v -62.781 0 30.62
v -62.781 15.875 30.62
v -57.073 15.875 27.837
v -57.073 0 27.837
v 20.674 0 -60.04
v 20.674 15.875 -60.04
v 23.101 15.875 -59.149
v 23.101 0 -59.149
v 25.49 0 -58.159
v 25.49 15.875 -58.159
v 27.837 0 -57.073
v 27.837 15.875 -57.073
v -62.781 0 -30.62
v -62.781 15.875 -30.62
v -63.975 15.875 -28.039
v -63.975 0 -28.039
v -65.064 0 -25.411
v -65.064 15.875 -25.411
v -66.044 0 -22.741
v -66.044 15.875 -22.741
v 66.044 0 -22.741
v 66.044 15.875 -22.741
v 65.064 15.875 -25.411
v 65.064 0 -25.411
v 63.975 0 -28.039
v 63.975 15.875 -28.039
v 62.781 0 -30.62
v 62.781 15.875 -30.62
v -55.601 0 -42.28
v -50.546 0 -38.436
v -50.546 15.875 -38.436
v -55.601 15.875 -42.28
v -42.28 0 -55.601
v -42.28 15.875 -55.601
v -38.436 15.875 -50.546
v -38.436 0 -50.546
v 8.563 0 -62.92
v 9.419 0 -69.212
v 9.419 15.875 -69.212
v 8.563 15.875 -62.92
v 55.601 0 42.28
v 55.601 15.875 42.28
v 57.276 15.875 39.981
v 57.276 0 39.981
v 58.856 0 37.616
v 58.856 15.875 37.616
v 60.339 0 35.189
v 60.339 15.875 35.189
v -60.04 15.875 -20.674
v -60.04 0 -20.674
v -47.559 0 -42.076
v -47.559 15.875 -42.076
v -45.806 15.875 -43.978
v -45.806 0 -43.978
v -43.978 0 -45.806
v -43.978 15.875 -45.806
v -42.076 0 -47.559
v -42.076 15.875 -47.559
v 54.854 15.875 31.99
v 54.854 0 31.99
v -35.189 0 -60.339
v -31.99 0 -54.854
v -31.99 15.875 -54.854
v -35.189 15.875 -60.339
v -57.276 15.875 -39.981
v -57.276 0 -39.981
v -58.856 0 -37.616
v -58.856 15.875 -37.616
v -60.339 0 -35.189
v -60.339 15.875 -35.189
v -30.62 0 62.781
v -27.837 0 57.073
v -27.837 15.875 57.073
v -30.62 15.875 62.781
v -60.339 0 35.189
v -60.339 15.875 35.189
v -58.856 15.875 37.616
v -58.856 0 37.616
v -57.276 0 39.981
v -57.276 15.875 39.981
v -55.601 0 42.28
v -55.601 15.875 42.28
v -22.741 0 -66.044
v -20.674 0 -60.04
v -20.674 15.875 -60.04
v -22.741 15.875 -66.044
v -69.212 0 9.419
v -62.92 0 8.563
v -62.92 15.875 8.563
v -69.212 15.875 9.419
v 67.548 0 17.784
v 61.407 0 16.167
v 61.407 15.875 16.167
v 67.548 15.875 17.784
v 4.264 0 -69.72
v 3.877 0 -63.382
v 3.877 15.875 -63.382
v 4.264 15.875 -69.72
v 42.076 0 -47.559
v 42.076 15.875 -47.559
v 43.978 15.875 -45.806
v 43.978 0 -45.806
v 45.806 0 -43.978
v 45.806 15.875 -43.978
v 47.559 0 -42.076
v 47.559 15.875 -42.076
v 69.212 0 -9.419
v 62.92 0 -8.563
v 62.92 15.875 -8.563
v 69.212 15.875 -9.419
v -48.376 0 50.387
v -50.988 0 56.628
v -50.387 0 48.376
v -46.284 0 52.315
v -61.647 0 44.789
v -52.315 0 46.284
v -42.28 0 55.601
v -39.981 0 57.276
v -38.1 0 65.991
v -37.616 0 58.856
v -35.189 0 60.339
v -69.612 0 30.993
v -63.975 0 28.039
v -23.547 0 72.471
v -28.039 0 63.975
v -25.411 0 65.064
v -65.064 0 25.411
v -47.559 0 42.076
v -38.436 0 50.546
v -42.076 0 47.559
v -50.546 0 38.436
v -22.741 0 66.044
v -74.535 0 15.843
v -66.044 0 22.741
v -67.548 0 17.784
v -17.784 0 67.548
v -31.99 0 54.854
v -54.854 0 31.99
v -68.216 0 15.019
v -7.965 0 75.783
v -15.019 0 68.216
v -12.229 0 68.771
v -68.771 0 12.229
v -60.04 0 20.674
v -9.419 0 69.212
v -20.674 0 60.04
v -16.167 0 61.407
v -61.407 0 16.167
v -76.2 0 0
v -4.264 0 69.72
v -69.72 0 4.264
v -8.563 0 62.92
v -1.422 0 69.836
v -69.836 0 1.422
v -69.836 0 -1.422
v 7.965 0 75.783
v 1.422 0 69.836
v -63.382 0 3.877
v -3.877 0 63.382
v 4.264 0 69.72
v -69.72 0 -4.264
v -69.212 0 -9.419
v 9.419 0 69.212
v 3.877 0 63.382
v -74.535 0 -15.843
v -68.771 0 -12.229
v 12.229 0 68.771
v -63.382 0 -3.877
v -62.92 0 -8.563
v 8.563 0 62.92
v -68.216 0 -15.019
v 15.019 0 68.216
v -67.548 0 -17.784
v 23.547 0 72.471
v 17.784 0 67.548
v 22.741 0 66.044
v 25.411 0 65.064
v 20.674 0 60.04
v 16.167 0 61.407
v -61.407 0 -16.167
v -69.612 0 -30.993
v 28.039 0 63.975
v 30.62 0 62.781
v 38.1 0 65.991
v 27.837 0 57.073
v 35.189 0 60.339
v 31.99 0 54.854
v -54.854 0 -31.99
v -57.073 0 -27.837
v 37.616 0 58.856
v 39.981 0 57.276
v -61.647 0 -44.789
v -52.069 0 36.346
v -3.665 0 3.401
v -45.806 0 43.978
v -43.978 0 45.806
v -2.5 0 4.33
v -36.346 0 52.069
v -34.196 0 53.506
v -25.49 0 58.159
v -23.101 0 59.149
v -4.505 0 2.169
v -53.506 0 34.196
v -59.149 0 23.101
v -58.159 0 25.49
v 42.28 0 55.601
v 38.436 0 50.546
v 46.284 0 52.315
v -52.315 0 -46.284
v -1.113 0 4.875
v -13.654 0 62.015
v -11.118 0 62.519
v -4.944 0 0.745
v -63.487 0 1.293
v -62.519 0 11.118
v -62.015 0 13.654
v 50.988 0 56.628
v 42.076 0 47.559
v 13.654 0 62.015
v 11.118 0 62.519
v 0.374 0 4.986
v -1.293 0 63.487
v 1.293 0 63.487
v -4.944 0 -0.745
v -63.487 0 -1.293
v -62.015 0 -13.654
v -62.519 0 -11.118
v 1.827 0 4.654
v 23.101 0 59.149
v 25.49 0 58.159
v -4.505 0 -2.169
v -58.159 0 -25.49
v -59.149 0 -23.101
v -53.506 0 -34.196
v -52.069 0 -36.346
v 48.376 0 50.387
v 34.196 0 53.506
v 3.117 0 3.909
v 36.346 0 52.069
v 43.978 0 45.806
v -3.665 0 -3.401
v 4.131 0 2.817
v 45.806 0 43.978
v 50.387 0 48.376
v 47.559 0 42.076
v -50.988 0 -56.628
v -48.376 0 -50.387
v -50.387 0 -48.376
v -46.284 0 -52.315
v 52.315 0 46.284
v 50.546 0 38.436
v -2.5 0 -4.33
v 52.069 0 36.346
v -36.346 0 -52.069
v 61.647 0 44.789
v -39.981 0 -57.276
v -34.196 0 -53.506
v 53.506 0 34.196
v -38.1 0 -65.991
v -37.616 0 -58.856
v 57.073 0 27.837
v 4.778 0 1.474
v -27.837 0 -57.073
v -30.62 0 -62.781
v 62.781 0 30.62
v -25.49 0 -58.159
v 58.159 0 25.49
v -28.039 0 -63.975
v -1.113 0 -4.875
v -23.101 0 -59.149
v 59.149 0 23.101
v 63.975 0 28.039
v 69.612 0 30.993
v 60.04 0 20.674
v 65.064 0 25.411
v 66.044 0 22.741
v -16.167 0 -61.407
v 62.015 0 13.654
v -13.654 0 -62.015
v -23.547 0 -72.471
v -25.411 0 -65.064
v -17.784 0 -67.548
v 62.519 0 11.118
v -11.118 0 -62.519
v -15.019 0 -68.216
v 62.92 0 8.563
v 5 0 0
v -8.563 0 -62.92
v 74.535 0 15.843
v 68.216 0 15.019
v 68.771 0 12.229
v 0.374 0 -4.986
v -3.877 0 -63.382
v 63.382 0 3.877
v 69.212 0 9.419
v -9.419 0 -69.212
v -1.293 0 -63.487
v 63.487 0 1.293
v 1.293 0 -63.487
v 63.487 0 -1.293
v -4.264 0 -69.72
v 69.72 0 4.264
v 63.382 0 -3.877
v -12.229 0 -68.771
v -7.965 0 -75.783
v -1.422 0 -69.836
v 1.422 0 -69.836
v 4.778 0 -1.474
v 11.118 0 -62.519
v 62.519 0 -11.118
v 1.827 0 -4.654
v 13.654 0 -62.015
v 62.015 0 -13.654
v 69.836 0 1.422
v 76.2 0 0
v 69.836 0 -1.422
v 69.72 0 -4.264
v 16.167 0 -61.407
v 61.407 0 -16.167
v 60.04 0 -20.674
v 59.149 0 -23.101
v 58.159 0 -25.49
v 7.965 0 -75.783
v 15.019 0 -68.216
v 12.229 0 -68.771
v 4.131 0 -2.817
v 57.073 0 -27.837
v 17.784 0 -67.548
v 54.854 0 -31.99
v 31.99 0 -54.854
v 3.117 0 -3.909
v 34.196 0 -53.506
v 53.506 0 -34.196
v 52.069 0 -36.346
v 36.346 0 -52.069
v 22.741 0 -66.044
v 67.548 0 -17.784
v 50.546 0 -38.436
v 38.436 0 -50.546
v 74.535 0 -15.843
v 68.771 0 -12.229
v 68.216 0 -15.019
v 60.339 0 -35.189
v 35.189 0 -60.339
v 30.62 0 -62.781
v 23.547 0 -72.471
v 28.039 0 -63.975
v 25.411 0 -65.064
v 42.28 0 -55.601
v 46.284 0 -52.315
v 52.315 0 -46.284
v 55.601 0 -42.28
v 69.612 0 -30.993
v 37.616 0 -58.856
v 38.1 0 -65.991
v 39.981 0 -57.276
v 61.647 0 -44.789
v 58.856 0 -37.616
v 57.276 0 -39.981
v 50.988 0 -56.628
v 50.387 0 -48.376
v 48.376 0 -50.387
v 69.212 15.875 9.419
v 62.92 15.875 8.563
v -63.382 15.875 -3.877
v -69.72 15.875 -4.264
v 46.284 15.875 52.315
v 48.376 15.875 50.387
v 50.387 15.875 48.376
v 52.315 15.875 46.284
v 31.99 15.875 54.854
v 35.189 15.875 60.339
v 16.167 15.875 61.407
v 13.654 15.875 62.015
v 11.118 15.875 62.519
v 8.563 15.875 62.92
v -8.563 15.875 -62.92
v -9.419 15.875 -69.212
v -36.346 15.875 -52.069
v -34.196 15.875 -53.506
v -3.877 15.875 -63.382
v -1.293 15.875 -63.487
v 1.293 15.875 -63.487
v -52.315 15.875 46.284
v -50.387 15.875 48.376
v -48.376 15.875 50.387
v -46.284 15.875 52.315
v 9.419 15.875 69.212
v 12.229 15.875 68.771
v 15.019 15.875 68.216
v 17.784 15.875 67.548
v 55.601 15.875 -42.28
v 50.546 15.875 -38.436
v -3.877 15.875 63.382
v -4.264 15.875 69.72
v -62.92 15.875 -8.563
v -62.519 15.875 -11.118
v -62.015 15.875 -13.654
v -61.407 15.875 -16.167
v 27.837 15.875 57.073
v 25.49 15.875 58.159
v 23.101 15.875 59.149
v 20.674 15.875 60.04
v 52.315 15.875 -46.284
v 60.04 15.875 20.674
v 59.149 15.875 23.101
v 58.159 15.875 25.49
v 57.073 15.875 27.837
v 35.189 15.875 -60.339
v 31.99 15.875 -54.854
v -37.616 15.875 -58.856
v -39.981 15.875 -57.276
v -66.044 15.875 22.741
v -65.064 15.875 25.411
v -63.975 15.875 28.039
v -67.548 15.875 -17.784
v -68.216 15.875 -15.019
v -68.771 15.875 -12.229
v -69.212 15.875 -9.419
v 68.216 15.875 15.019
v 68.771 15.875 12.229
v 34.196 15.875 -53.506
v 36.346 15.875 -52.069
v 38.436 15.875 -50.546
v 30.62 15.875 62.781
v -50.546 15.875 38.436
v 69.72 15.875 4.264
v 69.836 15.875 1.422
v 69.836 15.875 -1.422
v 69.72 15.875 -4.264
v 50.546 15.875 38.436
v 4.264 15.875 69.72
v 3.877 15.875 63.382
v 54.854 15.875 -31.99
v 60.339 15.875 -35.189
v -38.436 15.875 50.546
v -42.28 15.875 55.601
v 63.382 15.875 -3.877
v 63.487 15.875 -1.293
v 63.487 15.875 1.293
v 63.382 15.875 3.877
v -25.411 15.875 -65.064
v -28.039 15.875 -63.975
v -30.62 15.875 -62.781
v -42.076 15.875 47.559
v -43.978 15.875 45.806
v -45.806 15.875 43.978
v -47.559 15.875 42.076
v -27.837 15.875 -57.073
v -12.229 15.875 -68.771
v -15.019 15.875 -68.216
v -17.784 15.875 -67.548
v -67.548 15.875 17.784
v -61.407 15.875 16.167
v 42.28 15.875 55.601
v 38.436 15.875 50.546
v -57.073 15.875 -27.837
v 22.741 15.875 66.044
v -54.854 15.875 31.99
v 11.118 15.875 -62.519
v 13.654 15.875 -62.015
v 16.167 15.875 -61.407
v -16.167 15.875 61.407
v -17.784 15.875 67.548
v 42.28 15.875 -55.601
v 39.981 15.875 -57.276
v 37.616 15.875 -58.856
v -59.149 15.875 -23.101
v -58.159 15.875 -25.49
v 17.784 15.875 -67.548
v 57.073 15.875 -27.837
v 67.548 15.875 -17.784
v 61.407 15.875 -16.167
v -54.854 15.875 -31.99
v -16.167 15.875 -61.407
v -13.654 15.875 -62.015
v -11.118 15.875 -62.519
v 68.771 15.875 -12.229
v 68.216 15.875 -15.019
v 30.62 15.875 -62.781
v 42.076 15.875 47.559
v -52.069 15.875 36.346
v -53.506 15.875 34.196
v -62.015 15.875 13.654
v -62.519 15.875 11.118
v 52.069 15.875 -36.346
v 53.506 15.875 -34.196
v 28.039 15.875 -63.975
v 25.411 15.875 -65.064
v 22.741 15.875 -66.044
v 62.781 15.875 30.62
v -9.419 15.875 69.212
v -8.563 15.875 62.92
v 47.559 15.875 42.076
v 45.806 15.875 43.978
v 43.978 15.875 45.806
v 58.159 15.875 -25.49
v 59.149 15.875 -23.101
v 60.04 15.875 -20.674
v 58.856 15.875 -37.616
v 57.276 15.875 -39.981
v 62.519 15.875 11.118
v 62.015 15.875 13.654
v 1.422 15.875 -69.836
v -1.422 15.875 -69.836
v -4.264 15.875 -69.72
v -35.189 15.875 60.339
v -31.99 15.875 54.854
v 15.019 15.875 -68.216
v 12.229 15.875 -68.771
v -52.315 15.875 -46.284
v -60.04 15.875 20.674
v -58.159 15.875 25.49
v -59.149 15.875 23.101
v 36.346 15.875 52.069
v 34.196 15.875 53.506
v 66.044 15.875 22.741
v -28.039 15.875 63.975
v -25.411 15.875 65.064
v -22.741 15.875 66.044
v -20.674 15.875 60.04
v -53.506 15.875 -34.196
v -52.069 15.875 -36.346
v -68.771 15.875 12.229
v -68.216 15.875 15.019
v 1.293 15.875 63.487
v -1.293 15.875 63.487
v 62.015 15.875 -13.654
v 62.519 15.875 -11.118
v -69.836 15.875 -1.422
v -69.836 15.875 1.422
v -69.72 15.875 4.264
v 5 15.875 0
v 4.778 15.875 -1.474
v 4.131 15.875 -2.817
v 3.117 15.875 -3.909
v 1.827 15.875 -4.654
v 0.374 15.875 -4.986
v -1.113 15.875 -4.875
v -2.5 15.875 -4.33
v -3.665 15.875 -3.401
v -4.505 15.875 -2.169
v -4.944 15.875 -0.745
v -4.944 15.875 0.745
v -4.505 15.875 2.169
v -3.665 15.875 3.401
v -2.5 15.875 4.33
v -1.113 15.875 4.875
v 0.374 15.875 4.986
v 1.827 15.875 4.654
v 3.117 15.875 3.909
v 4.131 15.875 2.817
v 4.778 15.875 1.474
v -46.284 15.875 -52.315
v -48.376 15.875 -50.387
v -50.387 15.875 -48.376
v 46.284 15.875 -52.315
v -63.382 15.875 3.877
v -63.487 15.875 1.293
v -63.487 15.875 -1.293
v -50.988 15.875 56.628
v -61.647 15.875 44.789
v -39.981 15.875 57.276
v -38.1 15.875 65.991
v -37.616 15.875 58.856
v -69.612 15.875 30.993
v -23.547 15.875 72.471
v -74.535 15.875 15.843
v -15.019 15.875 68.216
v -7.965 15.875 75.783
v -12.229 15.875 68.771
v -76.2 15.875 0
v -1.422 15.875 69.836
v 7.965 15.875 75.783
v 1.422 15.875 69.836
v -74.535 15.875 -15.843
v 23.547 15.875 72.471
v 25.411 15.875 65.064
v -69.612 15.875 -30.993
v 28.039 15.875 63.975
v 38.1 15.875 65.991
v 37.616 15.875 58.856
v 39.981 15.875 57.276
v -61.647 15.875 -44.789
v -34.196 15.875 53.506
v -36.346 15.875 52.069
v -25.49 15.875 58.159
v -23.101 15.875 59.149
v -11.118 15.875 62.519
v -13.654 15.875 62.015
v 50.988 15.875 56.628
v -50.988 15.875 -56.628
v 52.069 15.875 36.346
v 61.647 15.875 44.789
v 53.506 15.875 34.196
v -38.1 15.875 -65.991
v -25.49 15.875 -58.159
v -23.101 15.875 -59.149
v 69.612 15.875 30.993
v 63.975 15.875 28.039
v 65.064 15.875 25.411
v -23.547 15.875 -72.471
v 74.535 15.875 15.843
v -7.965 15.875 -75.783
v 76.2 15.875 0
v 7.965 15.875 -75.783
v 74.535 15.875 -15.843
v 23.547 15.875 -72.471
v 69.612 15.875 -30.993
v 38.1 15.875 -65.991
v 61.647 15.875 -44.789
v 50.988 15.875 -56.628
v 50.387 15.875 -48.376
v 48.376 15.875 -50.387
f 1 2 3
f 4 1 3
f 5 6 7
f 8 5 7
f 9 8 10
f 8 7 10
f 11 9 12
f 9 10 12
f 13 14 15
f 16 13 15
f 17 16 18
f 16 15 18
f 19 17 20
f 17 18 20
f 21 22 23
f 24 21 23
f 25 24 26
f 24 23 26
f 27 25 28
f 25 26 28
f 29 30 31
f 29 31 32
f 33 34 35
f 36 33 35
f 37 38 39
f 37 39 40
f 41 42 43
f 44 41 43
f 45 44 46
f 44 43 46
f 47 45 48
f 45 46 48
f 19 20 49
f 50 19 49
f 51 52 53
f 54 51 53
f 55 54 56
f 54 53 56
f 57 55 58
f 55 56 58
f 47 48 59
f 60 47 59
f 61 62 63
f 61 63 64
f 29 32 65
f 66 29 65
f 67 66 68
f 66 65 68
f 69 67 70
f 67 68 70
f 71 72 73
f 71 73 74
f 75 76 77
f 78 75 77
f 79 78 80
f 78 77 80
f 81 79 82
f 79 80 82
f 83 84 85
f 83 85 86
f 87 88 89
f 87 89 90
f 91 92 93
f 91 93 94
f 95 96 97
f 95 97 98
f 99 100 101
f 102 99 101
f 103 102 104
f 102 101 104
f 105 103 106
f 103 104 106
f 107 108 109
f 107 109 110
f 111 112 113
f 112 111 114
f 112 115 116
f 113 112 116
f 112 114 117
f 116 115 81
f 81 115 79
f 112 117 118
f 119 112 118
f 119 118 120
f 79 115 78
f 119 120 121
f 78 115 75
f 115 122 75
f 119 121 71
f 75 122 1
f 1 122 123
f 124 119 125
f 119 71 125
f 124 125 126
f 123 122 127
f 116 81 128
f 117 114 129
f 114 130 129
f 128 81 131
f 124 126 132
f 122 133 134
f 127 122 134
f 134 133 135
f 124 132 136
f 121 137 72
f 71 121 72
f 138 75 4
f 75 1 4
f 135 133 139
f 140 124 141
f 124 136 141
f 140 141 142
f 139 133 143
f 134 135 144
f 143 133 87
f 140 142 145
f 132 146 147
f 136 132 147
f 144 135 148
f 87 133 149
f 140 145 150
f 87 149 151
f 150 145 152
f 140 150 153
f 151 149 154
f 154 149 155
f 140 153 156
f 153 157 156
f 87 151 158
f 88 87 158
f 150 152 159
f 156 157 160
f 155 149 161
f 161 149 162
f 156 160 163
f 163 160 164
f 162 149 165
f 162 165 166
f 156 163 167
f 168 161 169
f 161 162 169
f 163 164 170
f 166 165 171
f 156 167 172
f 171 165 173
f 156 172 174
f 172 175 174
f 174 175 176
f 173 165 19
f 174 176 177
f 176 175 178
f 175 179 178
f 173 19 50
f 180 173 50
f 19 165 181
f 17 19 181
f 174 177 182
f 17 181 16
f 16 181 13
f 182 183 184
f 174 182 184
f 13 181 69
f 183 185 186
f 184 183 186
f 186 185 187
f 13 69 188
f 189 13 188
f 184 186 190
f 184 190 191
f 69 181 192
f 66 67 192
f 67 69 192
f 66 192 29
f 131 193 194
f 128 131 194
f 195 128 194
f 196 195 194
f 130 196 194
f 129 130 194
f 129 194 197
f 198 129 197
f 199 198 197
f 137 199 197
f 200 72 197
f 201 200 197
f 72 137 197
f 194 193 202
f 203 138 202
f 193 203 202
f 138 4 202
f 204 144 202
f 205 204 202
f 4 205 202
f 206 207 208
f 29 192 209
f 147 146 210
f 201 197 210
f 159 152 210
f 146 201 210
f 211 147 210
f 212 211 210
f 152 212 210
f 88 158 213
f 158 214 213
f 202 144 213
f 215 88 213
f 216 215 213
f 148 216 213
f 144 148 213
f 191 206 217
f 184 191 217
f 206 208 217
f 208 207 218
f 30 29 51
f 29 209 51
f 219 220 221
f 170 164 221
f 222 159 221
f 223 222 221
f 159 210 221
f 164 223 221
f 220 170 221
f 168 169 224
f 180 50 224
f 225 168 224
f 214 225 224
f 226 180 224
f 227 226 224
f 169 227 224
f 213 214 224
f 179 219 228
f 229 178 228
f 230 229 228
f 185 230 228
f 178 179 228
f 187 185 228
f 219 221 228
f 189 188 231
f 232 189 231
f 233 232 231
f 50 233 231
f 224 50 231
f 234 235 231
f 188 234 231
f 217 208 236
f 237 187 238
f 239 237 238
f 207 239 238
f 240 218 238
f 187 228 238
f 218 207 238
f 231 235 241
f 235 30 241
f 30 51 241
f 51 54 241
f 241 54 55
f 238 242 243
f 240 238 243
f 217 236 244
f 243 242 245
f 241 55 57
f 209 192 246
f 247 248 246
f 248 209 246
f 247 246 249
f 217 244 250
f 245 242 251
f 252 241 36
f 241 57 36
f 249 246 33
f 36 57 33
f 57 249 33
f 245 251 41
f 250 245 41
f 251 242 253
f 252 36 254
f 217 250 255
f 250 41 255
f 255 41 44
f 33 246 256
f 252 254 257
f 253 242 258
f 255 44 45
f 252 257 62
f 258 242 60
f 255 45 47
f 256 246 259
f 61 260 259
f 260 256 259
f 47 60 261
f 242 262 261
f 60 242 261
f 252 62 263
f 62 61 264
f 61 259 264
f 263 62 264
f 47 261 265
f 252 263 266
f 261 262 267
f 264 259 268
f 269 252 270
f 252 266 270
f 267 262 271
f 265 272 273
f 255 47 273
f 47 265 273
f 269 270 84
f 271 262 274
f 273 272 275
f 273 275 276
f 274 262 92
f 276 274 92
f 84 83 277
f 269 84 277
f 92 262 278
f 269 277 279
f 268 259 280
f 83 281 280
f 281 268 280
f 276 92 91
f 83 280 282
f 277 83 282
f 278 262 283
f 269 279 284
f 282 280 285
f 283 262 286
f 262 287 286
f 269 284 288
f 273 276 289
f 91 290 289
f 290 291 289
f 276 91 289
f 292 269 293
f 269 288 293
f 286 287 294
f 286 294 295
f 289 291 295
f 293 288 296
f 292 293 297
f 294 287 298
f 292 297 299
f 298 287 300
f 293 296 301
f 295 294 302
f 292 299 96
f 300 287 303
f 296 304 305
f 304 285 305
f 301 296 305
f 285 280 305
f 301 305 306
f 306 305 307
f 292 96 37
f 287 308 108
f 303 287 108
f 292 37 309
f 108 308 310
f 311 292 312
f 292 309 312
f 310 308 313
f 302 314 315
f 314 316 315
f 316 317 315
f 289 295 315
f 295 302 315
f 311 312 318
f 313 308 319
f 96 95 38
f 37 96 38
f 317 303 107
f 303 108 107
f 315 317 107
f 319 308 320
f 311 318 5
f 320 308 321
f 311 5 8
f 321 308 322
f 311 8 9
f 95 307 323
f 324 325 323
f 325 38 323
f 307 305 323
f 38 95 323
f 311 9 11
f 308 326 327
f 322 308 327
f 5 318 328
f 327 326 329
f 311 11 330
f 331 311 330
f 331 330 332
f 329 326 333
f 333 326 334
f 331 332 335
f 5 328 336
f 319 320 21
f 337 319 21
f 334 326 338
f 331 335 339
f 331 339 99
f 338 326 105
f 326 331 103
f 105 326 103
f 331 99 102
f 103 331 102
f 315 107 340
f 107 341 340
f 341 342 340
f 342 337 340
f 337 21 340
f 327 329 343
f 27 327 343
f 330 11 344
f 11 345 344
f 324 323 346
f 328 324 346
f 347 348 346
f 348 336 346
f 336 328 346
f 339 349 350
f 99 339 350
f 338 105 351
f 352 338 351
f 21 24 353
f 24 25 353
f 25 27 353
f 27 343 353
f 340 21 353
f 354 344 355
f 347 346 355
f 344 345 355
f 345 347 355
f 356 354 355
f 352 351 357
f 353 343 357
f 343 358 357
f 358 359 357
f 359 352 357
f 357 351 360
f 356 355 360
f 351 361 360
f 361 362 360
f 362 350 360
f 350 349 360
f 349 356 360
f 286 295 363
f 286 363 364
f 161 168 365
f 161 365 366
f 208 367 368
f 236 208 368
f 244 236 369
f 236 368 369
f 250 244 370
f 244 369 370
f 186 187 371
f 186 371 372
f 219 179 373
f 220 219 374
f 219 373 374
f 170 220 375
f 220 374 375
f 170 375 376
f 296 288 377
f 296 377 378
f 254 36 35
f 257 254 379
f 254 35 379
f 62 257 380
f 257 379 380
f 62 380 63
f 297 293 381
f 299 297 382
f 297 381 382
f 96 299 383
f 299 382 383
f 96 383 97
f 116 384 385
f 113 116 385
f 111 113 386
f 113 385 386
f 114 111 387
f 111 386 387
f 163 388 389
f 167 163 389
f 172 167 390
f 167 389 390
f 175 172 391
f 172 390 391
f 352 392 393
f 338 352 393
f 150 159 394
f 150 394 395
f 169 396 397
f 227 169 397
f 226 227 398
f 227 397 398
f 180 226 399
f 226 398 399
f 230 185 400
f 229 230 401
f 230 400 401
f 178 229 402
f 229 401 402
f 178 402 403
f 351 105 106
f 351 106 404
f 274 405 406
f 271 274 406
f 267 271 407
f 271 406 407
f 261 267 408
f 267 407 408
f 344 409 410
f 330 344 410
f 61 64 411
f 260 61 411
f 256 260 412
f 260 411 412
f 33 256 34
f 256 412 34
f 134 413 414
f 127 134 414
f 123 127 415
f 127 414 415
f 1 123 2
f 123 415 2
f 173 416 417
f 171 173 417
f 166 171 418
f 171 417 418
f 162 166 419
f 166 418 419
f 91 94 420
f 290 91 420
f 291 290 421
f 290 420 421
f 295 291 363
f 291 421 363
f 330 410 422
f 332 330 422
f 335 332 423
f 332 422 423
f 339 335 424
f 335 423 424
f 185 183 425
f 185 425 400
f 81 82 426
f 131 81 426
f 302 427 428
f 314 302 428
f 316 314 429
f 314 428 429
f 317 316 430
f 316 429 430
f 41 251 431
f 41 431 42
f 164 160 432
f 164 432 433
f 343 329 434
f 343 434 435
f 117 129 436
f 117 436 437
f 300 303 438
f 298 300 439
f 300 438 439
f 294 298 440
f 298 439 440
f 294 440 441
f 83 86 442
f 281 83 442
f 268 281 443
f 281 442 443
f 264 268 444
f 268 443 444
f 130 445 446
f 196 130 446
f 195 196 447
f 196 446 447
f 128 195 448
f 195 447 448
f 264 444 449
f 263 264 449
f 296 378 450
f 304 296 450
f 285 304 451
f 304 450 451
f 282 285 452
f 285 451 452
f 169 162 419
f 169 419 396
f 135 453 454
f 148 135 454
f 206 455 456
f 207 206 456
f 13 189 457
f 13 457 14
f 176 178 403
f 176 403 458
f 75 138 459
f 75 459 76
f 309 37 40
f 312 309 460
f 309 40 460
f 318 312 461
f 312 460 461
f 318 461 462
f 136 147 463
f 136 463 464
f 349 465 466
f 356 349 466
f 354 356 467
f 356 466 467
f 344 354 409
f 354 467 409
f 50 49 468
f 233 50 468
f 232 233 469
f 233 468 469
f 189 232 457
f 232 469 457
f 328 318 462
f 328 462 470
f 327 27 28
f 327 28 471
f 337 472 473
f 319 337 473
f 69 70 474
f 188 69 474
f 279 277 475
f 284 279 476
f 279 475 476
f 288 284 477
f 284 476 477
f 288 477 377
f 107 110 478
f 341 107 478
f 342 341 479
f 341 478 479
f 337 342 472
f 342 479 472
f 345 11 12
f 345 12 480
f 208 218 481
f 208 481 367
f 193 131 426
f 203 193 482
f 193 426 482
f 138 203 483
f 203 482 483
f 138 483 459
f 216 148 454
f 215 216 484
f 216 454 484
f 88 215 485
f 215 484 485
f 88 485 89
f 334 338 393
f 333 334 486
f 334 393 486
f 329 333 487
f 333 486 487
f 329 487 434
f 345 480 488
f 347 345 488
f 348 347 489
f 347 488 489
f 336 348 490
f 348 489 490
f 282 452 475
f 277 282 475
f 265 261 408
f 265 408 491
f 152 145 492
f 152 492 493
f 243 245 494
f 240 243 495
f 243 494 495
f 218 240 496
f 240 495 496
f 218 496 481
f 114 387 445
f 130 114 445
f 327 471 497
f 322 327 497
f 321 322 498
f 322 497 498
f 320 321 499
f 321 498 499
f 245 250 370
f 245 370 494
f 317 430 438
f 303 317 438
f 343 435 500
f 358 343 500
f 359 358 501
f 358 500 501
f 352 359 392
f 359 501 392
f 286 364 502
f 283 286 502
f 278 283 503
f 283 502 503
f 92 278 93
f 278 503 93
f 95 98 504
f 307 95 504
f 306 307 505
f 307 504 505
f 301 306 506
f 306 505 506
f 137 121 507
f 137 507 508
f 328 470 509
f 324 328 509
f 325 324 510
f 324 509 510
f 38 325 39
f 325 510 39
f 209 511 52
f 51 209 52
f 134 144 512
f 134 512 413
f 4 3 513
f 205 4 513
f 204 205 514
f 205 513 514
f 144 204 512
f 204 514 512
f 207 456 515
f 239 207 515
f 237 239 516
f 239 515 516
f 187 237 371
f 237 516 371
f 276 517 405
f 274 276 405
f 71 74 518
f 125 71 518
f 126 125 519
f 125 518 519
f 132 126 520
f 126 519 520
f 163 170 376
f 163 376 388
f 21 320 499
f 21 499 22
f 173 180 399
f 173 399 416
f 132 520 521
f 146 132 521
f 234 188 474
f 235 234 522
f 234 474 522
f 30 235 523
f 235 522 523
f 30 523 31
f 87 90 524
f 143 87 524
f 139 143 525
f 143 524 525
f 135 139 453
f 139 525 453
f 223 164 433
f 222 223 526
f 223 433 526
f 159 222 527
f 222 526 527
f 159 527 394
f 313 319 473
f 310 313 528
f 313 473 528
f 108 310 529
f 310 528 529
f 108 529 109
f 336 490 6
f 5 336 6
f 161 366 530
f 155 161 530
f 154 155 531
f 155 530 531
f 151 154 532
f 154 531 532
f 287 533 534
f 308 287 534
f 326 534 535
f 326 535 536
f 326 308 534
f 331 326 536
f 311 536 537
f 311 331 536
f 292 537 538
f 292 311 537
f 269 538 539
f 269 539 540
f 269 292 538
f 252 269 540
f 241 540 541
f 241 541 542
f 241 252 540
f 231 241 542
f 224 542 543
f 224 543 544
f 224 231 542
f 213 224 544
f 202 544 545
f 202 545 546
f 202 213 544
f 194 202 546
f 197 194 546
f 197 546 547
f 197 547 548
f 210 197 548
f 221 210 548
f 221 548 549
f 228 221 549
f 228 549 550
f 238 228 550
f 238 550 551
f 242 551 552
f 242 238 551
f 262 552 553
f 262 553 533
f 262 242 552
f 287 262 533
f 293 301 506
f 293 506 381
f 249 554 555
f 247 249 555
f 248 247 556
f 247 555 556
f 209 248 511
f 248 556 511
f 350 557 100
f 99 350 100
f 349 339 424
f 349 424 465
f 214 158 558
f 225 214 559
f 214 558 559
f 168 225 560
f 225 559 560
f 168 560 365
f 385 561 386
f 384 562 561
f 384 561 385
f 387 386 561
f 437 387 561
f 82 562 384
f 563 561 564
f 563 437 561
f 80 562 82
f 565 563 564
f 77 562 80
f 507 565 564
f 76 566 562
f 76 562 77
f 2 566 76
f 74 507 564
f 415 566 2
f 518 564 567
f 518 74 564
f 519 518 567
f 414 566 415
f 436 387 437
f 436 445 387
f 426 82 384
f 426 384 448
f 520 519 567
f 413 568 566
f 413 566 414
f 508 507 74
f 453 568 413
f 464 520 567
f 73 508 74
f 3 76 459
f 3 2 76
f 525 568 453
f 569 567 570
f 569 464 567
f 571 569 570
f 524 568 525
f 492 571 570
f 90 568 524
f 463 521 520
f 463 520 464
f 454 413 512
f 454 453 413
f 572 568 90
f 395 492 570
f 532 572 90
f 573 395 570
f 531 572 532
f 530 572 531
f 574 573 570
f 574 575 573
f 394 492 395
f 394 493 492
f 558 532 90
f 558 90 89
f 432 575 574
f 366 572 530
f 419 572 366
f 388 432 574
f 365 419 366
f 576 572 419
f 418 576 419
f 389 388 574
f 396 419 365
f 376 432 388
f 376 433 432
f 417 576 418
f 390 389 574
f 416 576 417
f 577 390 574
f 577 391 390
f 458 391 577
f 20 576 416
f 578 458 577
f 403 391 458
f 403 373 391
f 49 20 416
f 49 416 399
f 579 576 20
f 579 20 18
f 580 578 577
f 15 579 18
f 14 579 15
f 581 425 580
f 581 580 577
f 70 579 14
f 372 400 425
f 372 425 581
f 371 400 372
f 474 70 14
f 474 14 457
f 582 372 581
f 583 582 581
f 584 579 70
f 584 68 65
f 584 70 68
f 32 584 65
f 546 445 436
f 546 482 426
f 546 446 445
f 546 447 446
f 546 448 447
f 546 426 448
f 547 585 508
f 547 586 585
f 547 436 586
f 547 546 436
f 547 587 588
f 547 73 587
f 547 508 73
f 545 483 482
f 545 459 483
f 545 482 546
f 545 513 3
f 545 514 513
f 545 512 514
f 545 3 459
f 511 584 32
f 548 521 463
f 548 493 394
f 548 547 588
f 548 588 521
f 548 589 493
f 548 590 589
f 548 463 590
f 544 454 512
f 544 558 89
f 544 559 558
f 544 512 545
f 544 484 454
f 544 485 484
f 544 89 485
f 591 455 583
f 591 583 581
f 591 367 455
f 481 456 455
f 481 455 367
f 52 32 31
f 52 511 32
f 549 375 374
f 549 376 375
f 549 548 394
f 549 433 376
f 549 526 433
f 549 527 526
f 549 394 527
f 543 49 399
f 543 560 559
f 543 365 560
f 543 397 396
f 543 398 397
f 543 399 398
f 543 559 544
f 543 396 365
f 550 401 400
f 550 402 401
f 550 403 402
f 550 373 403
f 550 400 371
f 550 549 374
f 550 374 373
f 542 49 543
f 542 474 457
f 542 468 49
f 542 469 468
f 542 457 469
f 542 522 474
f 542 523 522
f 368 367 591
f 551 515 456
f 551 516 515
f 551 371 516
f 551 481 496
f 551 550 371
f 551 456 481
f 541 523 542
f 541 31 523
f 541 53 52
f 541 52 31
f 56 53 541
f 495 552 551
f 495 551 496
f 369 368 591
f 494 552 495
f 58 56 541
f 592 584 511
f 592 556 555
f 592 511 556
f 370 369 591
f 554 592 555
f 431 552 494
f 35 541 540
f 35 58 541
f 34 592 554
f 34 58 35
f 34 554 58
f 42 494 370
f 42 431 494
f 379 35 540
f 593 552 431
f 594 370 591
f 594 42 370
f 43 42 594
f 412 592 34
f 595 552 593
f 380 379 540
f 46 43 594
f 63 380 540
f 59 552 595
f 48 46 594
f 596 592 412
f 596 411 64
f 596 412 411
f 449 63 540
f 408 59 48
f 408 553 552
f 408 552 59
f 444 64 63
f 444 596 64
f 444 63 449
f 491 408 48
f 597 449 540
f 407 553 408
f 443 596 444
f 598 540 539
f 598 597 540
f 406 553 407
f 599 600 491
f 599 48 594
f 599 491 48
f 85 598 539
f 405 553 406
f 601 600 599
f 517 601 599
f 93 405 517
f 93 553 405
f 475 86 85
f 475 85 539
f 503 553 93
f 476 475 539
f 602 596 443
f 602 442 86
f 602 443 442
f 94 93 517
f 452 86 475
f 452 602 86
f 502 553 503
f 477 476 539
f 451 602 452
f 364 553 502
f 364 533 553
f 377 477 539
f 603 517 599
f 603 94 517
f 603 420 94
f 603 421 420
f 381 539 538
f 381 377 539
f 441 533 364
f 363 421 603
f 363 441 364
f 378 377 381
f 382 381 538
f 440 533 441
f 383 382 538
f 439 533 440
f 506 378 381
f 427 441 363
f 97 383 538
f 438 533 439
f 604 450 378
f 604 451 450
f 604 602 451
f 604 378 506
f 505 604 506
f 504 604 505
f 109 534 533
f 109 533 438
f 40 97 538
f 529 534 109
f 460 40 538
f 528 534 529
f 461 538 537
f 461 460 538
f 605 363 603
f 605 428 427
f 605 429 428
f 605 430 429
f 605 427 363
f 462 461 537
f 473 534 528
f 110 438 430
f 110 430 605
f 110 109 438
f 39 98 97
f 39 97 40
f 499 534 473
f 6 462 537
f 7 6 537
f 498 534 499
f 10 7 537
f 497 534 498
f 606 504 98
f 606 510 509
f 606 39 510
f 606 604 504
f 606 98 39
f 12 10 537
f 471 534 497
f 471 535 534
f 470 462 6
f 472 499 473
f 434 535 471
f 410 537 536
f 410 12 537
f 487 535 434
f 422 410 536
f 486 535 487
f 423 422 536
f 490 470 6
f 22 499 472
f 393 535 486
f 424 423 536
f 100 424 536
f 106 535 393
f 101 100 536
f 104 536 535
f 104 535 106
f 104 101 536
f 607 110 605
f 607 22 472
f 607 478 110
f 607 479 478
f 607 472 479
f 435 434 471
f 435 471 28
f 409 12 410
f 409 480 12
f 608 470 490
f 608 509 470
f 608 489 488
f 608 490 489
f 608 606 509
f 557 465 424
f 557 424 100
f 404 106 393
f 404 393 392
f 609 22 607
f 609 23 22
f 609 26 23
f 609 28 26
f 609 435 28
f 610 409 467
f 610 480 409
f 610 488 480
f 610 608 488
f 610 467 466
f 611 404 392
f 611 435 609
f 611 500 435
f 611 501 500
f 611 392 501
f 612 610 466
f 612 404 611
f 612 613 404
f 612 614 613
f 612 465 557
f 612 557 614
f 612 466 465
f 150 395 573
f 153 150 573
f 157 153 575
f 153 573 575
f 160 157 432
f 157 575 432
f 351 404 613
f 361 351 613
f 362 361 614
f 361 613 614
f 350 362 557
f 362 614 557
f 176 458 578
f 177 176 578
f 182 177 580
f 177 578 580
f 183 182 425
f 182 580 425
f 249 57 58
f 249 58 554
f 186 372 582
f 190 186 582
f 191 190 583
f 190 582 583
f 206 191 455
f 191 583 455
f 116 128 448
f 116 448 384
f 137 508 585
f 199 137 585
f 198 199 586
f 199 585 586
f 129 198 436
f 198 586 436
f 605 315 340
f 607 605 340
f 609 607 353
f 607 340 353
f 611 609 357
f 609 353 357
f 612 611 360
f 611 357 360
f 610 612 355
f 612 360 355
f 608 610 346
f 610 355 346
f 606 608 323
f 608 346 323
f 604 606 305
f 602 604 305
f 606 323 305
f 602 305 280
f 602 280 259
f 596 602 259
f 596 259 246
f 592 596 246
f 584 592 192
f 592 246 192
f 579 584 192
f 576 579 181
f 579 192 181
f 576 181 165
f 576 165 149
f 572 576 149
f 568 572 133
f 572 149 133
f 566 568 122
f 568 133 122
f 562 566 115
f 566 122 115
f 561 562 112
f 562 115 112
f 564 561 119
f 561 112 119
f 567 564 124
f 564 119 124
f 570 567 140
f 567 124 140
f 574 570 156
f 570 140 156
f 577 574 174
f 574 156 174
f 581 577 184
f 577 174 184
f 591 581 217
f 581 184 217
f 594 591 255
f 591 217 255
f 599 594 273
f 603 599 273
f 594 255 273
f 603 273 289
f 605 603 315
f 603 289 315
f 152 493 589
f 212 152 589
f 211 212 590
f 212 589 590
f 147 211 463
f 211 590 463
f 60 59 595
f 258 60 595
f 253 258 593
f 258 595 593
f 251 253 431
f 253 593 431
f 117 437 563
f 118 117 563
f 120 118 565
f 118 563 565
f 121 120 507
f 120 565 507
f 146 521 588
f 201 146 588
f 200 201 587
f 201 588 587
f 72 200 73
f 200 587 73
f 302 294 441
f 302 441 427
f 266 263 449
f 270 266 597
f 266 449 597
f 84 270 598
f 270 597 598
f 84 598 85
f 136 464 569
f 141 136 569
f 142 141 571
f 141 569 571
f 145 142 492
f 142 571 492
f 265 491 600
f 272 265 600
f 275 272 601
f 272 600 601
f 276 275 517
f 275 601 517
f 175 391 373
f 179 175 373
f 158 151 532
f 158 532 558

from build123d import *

# Parameters (mm, degrees)
SKETCH2_R           = 76.2
SKETCH2_R_2         = 5
BOSS_EXTRUDE1_DEPTH = 15.875
CUT_EXTRUDE1_DEPTH  = 16.875
CIRPATTERN1_COUNT   = 32


with BuildPart() as part:
    # Sketch2 → Boss-Extrude1 (new body)
    with BuildSketch(Plane(origin=(0, 0, 0), x_dir=(1, 0, 0), z_dir=(0, 1, 0))):
        Circle(SKETCH2_R)
        Circle(SKETCH2_R_2, mode=Mode.SUBTRACT)
    extrude(amount=BOSS_EXTRUDE1_DEPTH)

    # Sketch3 → Cut-Extrude1 (cut, through all)
    with BuildSketch(Plane(origin=(0, 15.875, 0), x_dir=(1, 0, 0), z_dir=(0, 1, 0))):
        with BuildLine():
            Line((-4.264240487, 69.71971567), (-3.87658226, 63.3815597))
            ThreePointArc((-3.87658226, 63.3815597), (0, 63.5), (3.87658226, 63.3815597))
            Line((3.87658226, 63.3815597), (4.264240487, 69.71971567))
            ThreePointArc((4.264240487, 69.71971567), (0, 69.85), (-4.264240487, 69.71971567))
        make_face()
    cut_extrude1 = extrude(amount=-CUT_EXTRUDE1_DEPTH, mode=Mode.SUBTRACT)

    # CirPattern1: Cut-Extrude1 ×32 about axis
    cirpattern1_axis = Axis((0, 0, 0), (0, 1, 0))
    for i in range(1, CIRPATTERN1_COUNT):
        add(cut_extrude1.rotate(cirpattern1_axis, i * 360 / CIRPATTERN1_COUNT), mode=Mode.SUBTRACT)


solid = part.part
